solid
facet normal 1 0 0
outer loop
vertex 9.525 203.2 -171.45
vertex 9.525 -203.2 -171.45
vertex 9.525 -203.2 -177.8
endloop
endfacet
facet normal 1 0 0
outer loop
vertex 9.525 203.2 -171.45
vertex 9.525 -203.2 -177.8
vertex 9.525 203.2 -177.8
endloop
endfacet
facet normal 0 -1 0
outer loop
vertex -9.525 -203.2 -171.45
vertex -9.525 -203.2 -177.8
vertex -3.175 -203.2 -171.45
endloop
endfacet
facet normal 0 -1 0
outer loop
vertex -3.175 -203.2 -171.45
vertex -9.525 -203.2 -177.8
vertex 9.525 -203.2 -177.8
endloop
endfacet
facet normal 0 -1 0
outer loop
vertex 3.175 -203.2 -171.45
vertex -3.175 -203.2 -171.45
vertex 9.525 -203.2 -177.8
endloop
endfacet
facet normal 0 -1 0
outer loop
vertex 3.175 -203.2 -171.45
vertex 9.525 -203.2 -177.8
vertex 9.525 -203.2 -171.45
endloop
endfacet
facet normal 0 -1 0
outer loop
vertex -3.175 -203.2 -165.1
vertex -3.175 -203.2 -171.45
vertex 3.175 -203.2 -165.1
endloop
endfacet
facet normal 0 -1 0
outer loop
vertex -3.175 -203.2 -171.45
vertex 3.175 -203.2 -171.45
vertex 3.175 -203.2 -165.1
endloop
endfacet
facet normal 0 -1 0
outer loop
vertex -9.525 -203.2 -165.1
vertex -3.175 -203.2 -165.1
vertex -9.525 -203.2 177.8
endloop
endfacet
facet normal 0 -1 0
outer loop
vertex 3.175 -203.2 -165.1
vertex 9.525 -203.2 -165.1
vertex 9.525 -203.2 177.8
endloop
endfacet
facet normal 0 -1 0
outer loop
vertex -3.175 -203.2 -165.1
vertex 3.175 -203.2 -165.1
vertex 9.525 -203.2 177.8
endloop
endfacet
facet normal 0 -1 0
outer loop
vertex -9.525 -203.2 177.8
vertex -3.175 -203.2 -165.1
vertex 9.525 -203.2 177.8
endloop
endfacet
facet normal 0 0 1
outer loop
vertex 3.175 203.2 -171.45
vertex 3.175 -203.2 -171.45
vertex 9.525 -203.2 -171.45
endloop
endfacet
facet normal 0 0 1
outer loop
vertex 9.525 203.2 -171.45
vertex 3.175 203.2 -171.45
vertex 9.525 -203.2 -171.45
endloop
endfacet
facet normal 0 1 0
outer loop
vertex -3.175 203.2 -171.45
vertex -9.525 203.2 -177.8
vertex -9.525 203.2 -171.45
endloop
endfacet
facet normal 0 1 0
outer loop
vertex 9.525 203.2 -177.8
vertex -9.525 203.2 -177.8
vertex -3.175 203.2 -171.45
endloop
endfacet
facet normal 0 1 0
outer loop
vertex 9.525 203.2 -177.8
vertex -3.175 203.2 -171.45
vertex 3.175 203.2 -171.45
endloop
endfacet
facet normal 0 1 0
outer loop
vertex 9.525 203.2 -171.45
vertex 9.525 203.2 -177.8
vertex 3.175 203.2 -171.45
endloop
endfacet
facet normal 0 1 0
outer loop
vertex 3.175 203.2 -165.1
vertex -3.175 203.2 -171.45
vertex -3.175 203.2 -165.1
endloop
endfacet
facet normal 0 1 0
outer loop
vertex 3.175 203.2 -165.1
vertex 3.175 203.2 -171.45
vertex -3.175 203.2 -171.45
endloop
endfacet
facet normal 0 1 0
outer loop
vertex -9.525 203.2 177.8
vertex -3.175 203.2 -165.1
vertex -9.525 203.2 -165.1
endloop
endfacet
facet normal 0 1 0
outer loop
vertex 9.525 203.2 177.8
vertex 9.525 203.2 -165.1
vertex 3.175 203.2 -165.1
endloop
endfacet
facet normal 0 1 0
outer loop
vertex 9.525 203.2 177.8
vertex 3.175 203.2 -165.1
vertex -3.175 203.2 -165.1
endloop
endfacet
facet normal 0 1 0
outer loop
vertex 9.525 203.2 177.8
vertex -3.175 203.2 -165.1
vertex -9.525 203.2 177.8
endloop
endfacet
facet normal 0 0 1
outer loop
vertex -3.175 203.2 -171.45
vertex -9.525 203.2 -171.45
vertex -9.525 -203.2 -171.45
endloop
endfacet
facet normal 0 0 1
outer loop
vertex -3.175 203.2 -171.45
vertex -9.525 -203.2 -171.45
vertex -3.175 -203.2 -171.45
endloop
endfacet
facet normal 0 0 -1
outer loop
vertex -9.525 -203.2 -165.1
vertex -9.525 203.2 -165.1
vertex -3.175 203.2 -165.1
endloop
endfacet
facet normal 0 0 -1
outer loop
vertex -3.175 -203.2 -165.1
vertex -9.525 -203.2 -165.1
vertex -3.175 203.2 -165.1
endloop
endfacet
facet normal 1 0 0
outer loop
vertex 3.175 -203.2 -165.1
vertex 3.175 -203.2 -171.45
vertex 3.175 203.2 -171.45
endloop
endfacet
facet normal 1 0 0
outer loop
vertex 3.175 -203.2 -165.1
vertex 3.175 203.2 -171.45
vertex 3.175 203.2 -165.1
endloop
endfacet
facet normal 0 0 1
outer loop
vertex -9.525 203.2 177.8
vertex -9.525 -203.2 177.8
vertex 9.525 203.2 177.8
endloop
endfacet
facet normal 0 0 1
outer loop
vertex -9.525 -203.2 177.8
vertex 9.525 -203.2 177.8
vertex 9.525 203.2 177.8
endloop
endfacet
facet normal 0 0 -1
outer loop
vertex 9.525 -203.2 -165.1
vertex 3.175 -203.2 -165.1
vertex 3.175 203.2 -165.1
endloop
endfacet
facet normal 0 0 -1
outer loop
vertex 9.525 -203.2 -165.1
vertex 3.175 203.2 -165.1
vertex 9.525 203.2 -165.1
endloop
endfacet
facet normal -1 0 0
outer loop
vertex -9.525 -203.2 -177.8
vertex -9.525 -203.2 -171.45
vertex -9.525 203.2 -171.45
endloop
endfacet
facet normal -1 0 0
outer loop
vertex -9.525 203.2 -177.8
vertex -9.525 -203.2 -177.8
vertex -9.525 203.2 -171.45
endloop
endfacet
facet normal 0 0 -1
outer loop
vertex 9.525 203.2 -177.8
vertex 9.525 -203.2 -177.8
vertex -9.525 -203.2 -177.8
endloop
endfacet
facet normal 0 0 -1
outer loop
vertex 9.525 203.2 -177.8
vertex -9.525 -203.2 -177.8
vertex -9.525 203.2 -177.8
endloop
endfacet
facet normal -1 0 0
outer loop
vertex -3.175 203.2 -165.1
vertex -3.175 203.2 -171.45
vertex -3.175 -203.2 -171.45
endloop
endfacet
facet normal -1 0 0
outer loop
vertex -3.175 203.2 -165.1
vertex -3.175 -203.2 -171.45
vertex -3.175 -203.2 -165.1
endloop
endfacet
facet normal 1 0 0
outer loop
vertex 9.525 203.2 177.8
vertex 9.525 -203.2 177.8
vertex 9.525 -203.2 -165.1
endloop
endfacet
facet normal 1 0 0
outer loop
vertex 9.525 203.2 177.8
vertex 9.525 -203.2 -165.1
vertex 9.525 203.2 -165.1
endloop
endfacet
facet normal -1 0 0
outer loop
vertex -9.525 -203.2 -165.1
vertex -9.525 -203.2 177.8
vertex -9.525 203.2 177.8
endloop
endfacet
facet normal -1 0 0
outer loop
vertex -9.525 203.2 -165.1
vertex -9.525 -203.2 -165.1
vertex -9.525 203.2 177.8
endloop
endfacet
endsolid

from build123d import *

# Parameters (mm, degrees)
F0_W     = 406.4
F0_H     = 355.6
F1_DEPTH = 9.525
F2_W     = 6.35
F2_H     = 6.35
F3_DEPTH = 254


with BuildPart() as f1:
    # F0 (on Right) → F1 (new body, symmetric)
    with BuildSketch(Plane.YZ):
        Rectangle(F0_W, F0_H)
    extrude(amount=F1_DEPTH, both=True)

    # F2 (on Front) → F3 (cut, symmetric)
    with BuildSketch(Plane.XZ):
        with Locations((-6.35, -168.275)):
            Rectangle(F2_W, F2_H)
        with Locations((6.35, -168.275)):
            Rectangle(F2_W, F2_H)
    extrude(amount=F3_DEPTH, both=True, mode=Mode.SUBTRACT)


solid = f1.part
